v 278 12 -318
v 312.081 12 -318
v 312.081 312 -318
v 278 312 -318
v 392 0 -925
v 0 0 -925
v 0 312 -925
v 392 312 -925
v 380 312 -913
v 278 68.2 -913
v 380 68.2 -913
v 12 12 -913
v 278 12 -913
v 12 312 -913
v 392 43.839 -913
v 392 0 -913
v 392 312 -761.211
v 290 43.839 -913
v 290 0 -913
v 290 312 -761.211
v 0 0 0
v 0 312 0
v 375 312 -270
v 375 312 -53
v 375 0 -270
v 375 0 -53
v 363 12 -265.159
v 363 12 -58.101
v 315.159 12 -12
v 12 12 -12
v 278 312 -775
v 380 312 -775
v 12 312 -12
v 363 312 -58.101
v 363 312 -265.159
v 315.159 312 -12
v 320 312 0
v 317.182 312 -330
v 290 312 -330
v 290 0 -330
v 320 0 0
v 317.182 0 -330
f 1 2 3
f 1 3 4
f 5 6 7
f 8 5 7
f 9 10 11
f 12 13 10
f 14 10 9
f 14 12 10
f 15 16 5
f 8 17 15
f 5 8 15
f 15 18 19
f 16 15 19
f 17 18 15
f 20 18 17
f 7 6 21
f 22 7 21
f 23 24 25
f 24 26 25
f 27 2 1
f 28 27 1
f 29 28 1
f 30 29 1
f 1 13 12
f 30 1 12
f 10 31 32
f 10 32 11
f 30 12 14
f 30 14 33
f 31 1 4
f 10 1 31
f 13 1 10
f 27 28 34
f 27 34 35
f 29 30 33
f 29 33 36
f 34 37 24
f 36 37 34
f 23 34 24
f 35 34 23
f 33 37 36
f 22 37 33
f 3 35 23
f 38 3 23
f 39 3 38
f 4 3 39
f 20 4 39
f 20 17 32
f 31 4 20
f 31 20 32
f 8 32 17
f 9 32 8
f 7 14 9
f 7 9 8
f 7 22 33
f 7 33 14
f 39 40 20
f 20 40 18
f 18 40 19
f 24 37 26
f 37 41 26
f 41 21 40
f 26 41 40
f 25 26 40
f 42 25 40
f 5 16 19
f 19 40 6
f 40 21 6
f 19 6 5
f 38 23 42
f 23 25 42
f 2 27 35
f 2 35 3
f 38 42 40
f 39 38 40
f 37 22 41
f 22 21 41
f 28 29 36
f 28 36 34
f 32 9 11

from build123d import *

# Parameters (mm, degrees)
SKETCH_1_W          = 290
SKETCH_1_H          = 925
EXTRUDE_1_DEPTH     = 12
EXTRUDE_3_DEPTH     = 12
EXTRUDE_4_DEPTH     = 300
CUT_EXTRUDE_1_DEPTH = 12
EXTRUDE_5_DEPTH     = 90
EXTRUDE_6_DEPTH     = 102
EXTRUDE_7_DEPTH     = 12
EXTRUDE_8_DEPTH     = 102


with BuildPart() as part:
    # 草图1 → 凸台-拉伸1 (new body)
    with BuildSketch(Plane(origin=(0, 0, 0), x_dir=(1, 0, 0), z_dir=(0, 1, 0))):
        with Locations((145, 462.5)):
            Rectangle(SKETCH_1_W, SKETCH_1_H)
    extrude(amount=EXTRUDE_1_DEPTH)

    # 草图3 → 凸台-拉伸3 (add)
    with BuildSketch(Plane(origin=(0, 12, 0), x_dir=(1, 0, 0), z_dir=(0, 1, 0))):
        Polygon((290, 330), (317.181818182, 330), (375, 270), (375, 53), (320, 0), (290, 0), align=None)
    extrude(amount=-EXTRUDE_3_DEPTH)

    # 草图4 → 凸台-拉伸4 (add)
    with BuildSketch(Plane(origin=(0, 12, 0), x_dir=(1, 0, 0), z_dir=(0, 1, 0))):
        Polygon((0, 925), (0, 0), (320, 0), (375, 53), (375, 270), (317.181818182, 330), (290, 330), (290, 925), align=None)
        Polygon((12, 913), (12, 12), (315.159103589, 12), (363, 58.101227451), (363, 265.159103589), (312.080590731, 318), (278, 318), (278, 913), align=None, mode=Mode.SUBTRACT)
    extrude(amount=EXTRUDE_4_DEPTH)

    # 草图5 → 切除-拉伸1 (cut)
    with BuildSketch(Plane(origin=(290, 0, 0), x_dir=(0, 0, -1), z_dir=(1, 0, 0))):
        Polygon((775, 312), (925, 47), (925, 312), align=None)
    extrude(amount=-CUT_EXTRUDE_1_DEPTH, mode=Mode.SUBTRACT)

    # 草图7 → 凸台-拉伸5 (add)
    with BuildSketch(Plane(origin=(290, 0, 0), x_dir=(0, 0, -1), z_dir=(1, 0, 0))):
        Polygon((775, 312), (925, 47), (925, 22.639376034), (761.210967567, 312), align=None)
    extrude(amount=EXTRUDE_5_DEPTH)

    # 草图8 → 凸台-拉伸6 (add)
    with BuildSketch(Plane(origin=(278, 0, 0), x_dir=(0, 0, -1), z_dir=(1, 0, 0))):
        Polygon((925, 312), (925, 47), (913, 68.2), (913, 312), align=None)
    extrude(amount=EXTRUDE_6_DEPTH)

    # 草图9 → 凸台-拉伸7 (add)
    with BuildSketch(Plane(origin=(380, 0, 0), x_dir=(0, 0, -1), z_dir=(1, 0, 0))):
        Polygon((761.210967567, 312), (925, 312), (925, 22.639376034), align=None)
    extrude(amount=EXTRUDE_7_DEPTH)

    # 草图10 → 凸台-拉伸8 (add)
    with BuildSketch(Plane(origin=(290, 0, 0), x_dir=(0, 0, -1), z_dir=(1, 0, 0))):
        Polygon((925, 0), (925, 22.639376034), (913, 43.839376034), (913, 0), align=None)
    extrude(amount=EXTRUDE_8_DEPTH)


solid = part.part
